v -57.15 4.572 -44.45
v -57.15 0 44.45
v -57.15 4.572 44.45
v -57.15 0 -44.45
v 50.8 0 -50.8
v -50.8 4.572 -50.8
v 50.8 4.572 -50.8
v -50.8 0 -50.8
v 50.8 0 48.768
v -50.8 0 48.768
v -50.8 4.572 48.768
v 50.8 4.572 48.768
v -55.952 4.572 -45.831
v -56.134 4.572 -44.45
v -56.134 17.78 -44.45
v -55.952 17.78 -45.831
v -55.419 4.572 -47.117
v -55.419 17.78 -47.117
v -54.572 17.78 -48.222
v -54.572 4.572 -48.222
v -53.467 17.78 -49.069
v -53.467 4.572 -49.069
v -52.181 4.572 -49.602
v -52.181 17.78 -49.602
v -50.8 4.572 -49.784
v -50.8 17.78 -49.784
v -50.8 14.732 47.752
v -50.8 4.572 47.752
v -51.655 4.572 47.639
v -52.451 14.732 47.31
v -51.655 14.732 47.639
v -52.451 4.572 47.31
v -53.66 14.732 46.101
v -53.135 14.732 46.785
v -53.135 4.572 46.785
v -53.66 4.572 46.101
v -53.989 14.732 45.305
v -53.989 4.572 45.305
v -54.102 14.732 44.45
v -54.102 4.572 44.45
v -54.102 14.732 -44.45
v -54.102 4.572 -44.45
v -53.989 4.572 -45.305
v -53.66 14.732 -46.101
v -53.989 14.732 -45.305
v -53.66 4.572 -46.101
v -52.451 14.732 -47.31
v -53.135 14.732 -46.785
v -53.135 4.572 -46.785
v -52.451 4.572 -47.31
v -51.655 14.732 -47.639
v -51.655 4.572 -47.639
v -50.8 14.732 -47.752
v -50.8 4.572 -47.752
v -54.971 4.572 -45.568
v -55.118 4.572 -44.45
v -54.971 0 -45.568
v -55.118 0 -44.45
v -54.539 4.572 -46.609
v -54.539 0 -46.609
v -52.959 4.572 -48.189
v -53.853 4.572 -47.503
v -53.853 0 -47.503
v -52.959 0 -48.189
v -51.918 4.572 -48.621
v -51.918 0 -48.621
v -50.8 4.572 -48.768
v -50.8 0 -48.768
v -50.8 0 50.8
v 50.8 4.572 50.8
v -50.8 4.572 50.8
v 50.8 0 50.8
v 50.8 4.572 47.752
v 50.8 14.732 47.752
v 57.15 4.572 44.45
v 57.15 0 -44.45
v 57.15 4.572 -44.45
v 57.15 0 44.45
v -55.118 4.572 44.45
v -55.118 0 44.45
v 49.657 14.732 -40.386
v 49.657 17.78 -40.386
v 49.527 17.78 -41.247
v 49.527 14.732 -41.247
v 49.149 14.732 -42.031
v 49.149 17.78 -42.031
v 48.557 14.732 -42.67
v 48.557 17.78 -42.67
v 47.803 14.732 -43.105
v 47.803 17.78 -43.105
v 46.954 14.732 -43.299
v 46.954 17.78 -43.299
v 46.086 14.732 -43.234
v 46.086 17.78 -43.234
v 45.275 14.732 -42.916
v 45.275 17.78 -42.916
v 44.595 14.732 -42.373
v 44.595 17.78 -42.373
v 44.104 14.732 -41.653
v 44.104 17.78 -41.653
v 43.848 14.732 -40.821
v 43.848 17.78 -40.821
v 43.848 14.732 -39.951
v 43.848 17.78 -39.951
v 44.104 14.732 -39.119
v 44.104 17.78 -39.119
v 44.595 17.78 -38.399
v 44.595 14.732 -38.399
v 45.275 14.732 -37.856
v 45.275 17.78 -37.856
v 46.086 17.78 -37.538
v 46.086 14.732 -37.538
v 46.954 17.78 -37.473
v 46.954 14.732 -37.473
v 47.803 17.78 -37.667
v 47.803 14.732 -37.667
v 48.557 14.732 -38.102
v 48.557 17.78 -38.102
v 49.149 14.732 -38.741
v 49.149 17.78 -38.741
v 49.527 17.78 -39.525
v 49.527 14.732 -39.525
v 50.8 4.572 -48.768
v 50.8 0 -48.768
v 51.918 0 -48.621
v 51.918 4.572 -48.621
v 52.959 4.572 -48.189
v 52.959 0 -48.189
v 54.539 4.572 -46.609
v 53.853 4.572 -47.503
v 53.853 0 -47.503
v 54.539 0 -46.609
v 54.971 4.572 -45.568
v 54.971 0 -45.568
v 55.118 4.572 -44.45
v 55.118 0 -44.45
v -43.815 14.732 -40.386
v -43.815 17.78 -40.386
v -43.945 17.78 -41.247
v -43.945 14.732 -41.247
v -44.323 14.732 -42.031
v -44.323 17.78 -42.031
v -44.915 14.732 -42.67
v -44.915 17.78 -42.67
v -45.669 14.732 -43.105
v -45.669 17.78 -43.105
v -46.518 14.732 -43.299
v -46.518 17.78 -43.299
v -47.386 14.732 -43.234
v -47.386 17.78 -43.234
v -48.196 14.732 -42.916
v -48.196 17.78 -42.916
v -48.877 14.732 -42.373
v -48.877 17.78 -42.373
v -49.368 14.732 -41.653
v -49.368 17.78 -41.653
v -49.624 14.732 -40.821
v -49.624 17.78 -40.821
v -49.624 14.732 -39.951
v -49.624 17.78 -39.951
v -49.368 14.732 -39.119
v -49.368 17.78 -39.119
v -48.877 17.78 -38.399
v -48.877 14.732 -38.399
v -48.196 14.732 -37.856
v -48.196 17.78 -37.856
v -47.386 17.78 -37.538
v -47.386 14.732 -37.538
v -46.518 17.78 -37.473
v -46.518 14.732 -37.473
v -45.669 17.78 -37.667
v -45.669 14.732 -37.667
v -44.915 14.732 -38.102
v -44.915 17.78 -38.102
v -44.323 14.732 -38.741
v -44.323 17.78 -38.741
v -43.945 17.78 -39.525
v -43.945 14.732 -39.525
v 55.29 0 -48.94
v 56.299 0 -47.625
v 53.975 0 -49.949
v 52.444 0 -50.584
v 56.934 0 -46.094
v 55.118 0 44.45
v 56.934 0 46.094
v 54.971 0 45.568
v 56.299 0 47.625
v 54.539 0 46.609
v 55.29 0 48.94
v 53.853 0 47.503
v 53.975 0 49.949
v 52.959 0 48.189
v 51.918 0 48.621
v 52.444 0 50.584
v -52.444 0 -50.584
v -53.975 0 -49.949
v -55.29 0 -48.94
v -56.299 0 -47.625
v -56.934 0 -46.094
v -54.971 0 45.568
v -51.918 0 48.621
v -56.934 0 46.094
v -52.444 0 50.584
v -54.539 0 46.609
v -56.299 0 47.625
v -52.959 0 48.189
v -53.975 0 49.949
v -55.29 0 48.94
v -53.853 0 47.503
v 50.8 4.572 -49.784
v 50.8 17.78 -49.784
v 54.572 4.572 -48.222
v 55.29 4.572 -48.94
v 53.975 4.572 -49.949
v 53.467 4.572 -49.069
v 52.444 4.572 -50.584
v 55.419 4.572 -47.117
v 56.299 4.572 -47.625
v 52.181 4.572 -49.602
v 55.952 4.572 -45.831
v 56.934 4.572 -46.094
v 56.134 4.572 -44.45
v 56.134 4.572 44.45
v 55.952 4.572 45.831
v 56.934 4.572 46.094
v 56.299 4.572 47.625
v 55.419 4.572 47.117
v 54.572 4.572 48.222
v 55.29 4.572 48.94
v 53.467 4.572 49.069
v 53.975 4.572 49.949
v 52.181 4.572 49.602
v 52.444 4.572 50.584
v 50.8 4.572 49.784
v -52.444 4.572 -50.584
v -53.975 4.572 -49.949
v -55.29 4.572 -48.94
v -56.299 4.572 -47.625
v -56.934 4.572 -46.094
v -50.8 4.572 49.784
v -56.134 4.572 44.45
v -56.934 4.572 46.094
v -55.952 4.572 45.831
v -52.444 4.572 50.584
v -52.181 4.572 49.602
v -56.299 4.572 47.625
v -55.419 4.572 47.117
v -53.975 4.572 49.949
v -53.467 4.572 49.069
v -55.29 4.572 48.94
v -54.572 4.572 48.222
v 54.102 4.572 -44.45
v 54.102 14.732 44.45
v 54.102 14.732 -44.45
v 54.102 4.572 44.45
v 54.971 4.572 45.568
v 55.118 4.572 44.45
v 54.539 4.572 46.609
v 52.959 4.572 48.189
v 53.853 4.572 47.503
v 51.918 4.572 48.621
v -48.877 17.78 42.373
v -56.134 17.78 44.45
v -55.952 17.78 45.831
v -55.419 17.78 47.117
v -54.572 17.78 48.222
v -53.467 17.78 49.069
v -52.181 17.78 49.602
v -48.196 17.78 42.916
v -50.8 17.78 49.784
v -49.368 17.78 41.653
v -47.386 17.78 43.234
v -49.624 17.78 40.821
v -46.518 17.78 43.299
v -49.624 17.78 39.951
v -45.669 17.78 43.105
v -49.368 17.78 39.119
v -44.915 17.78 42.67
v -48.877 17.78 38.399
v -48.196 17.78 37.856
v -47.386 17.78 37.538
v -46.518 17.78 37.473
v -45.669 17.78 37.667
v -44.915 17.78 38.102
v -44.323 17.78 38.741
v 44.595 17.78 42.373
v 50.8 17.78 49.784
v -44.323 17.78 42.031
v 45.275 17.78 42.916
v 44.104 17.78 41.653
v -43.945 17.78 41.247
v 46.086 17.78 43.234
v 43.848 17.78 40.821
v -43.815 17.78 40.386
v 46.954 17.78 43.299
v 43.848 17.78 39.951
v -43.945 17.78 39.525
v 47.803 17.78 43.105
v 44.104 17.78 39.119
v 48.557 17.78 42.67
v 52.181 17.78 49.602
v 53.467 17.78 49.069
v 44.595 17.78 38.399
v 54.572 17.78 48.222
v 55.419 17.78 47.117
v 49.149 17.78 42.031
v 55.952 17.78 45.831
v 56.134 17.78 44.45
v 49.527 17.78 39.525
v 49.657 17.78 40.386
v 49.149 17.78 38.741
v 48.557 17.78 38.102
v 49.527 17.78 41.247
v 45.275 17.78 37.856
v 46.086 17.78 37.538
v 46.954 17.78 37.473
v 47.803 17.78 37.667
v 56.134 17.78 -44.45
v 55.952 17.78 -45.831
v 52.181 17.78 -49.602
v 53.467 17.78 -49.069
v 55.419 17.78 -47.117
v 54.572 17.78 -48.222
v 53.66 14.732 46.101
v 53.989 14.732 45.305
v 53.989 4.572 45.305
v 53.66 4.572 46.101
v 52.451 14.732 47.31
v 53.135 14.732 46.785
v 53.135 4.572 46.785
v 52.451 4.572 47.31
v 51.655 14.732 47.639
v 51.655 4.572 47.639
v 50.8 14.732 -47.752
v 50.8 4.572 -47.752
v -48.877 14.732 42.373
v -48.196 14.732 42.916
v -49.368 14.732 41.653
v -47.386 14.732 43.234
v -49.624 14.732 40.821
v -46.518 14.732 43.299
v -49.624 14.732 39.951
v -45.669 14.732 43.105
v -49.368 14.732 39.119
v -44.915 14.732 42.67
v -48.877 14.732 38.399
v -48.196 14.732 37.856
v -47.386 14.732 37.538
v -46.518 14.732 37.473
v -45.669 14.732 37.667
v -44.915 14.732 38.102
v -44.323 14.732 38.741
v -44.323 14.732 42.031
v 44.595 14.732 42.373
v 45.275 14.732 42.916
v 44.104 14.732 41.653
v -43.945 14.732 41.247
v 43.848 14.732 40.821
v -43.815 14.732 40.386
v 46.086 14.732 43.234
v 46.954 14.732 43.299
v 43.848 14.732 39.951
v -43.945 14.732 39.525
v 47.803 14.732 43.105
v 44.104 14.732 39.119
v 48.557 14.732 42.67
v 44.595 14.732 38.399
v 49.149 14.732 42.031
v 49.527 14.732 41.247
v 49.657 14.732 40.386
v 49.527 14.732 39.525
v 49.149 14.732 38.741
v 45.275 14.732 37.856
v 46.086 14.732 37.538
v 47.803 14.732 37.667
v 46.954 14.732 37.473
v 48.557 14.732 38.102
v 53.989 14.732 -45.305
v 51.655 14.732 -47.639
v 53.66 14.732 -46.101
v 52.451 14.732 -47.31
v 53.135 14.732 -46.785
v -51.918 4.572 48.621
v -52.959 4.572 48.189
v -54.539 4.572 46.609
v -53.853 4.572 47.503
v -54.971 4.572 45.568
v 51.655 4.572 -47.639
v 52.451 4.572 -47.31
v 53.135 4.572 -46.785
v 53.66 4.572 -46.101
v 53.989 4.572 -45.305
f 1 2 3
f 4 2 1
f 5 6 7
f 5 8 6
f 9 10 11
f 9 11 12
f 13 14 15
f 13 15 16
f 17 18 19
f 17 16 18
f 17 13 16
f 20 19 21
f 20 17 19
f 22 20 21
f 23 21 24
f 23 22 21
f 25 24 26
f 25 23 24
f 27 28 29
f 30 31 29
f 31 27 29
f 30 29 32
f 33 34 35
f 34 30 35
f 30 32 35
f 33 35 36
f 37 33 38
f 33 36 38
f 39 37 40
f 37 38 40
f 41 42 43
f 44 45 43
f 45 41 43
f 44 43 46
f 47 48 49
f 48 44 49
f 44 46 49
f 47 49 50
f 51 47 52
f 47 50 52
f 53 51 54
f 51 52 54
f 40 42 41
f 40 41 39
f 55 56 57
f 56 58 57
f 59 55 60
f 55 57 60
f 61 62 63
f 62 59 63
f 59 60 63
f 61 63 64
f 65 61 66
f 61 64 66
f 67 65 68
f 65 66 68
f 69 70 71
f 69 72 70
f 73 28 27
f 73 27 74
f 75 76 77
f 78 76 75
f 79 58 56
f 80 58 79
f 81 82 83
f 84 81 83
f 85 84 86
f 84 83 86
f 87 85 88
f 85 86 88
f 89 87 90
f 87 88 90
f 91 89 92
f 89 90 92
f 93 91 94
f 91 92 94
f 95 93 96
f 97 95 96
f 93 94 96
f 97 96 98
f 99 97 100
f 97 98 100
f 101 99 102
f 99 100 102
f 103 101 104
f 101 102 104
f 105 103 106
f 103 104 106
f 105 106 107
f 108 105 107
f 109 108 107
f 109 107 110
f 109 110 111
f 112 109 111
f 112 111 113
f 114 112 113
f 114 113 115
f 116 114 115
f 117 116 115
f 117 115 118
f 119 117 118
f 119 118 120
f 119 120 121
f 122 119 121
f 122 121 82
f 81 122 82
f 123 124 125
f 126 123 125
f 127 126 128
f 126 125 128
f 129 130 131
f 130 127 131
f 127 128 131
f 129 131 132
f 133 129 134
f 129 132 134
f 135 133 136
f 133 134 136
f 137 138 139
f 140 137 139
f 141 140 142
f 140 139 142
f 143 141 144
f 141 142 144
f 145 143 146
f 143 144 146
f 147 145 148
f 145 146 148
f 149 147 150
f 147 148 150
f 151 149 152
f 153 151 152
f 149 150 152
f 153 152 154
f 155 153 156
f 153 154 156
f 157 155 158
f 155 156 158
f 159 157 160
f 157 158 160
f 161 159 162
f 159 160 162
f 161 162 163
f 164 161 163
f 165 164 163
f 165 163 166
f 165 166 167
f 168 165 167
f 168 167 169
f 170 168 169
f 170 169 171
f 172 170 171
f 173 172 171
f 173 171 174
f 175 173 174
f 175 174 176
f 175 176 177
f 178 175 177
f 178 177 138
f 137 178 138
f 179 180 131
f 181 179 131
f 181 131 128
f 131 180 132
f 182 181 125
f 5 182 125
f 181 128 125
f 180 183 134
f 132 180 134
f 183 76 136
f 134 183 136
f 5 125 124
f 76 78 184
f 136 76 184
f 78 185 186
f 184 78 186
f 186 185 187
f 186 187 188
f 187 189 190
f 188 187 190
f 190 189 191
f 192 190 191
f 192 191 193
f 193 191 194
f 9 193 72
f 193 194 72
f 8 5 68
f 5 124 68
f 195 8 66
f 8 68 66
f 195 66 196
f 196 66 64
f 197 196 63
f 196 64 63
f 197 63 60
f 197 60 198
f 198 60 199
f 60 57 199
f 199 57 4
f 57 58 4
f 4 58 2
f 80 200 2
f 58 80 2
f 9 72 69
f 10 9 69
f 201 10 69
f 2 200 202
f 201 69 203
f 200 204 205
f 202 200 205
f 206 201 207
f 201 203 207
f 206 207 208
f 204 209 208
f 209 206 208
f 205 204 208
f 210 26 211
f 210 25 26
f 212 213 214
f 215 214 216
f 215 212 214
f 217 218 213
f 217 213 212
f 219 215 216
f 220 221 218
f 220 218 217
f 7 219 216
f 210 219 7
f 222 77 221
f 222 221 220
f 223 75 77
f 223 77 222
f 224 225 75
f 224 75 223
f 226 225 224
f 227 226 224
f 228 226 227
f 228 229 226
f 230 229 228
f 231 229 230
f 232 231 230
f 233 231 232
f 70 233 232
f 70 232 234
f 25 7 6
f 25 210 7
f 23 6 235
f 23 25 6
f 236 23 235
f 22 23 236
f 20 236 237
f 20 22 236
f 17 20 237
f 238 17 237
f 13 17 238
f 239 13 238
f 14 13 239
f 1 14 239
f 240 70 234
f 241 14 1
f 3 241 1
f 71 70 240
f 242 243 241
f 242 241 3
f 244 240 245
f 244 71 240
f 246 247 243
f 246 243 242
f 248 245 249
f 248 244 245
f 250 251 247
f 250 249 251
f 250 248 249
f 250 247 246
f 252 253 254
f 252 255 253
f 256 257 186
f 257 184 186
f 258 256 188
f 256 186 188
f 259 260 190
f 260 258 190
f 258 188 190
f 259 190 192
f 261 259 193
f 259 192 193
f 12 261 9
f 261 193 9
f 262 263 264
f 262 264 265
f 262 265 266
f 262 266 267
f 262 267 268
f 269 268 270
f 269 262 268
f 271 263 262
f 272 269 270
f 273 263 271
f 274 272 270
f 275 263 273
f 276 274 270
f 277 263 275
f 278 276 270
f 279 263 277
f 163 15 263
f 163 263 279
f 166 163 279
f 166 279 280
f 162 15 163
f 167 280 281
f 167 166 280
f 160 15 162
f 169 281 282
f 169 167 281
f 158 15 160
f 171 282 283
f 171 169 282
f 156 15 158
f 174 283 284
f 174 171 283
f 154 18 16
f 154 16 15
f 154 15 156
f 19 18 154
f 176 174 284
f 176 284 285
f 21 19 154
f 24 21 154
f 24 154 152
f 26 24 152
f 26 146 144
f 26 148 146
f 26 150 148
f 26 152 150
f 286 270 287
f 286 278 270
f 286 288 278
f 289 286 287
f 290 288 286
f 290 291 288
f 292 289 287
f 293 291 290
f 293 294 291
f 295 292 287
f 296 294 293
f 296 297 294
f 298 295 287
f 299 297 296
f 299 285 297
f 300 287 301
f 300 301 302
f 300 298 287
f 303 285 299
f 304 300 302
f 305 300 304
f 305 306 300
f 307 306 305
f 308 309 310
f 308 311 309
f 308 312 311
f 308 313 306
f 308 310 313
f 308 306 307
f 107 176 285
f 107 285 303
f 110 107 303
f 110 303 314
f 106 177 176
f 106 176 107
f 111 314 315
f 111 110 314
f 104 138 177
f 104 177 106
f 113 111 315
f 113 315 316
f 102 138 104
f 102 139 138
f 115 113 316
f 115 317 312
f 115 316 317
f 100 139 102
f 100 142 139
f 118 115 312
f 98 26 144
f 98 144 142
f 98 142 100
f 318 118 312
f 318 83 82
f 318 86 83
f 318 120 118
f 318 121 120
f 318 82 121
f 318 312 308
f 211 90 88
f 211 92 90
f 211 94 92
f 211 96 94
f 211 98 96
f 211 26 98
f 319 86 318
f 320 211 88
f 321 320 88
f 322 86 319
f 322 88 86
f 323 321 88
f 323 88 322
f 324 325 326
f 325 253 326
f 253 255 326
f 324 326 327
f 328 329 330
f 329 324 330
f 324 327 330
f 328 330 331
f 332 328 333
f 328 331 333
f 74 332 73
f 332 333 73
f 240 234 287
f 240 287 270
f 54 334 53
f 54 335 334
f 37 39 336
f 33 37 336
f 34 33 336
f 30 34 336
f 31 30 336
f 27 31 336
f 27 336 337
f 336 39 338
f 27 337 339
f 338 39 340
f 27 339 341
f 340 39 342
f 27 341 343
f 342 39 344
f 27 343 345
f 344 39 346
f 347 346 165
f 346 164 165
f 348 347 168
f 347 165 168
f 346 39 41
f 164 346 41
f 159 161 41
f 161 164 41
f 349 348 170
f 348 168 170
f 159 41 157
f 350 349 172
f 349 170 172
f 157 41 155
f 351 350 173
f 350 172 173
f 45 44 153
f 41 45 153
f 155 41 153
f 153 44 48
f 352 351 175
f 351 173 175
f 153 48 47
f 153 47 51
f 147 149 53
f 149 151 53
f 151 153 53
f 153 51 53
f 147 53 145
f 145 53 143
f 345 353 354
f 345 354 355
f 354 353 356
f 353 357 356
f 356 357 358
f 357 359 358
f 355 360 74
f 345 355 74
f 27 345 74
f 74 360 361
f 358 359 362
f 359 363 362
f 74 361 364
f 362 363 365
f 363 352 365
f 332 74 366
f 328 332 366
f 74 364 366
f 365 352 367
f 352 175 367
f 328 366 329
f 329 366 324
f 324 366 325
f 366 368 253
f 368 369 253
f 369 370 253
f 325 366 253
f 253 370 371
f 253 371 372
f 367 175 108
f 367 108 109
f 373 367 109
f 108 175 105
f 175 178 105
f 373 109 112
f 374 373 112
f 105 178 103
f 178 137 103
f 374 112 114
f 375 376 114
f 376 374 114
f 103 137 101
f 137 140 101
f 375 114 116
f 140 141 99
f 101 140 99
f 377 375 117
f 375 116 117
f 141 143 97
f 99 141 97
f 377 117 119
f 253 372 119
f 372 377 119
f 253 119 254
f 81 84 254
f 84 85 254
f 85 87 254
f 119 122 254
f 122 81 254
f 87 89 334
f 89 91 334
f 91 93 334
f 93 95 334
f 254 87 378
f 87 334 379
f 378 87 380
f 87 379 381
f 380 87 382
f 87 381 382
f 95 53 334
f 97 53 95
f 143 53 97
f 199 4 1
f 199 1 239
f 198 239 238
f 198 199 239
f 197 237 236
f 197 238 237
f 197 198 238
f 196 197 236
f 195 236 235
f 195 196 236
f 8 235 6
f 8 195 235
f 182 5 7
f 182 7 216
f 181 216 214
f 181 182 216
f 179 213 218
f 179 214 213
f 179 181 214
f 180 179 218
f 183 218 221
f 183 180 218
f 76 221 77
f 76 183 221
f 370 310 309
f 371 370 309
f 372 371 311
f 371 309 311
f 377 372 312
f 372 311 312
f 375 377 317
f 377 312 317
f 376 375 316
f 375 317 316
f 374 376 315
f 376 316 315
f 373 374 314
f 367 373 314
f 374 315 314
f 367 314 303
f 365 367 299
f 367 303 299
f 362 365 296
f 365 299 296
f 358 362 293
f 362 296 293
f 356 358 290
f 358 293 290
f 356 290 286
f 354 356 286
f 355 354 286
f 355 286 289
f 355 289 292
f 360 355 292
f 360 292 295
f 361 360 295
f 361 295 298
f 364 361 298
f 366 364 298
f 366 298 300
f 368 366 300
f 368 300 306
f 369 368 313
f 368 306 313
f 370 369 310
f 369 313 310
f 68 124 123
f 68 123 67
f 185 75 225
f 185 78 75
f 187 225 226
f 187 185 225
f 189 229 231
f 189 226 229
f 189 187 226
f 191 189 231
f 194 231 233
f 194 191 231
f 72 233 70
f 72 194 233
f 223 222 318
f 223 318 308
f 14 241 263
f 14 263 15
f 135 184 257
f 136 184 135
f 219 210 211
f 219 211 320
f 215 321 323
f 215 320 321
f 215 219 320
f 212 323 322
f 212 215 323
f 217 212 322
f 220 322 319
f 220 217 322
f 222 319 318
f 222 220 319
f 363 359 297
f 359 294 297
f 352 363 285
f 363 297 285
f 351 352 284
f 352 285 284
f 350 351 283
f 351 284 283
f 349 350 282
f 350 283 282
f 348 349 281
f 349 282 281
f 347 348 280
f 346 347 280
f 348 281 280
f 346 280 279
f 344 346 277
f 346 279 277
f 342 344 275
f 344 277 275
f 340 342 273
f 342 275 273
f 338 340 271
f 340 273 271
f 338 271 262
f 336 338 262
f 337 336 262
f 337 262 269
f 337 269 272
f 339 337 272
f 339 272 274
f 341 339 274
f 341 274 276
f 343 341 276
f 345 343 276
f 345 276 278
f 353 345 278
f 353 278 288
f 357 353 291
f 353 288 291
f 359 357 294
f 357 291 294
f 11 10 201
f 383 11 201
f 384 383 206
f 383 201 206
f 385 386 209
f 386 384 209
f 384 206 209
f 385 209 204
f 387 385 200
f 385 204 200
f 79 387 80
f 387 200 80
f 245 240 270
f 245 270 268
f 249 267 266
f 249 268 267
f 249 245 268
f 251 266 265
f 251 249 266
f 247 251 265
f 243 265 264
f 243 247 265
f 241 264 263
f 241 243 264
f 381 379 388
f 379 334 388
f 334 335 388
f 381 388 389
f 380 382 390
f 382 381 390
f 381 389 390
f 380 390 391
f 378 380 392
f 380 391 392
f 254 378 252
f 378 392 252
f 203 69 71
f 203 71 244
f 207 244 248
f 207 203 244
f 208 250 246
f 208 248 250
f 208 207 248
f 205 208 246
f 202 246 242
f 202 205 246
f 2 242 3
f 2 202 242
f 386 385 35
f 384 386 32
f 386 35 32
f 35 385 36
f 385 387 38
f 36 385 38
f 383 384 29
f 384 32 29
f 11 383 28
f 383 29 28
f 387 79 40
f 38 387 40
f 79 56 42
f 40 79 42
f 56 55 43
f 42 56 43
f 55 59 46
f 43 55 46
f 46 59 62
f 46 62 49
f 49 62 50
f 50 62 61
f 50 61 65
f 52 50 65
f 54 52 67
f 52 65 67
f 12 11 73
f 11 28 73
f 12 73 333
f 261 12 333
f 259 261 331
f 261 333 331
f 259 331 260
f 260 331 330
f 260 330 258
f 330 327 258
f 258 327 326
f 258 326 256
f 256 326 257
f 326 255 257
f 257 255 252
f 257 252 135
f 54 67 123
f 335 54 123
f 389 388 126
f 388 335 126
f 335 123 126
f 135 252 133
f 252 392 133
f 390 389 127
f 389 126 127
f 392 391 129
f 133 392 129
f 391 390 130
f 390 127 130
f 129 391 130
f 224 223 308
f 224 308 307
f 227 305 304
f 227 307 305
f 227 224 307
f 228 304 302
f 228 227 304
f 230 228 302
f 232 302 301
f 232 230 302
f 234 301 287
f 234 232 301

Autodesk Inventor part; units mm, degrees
ref_plane "YZ Plane" through (0, 0, 0) normal (1, 0, 0) x (0, 1, 0)
ref_plane "XZ Plane" through (0, 0, 0) normal (0, 1, 0) x (-1, 0, 0)
ref_plane "XY Plane" through (0, 0, 0) normal (0, 0, 1) x (1, 0, 0)
sketch "Sketch2" plane through (0, 0, 0) normal (0, 1, 0) x (-1, 0, 0)
  line L0 (-50.8, 50.8) -> (50.8, 50.8)
  line L1 (57.15, 44.45) -> (57.15, -44.45)
  line L2 (50.8, -50.8) -> (-50.8, -50.8)
  line L3 (-57.15, -44.45) -> (-57.15, 44.45)
  arc A0 (-50.8, 50.8) -> (-57.15, 44.45) centre (-50.8, 44.45) ccw
  arc A1 (-57.15, -44.45) -> (-50.8, -50.8) centre (-50.8, -44.45) ccw
  arc A2 (50.8, -50.8) -> (57.15, -44.45) centre (50.8, -44.45) ccw
  arc A3 (57.15, 44.45) -> (50.8, 50.8) centre (50.8, 44.45) ccw
  line L4 (50.8, 48.768) -> (-50.8, 48.768)
  arc A4 (-50.8, 48.768) -> (-55.118, 44.45) centre (-50.8, 44.45) ccw
  line L5 (-55.118, 44.45) -> (-55.118, -44.45)
  arc A5 (-55.118, -44.45) -> (-50.8, -48.768) centre (-50.8, -44.45) ccw
  line L6 (-50.8, -48.768) -> (50.8, -48.768)
  arc A6 (50.8, -48.768) -> (55.118, -44.45) centre (50.8, -44.45) ccw
  line L7 (55.118, -44.45) -> (55.118, 44.45)
  arc A7 (55.118, 44.45) -> (50.8, 48.768) centre (50.8, 44.45) ccw
  line L8 (-50.8, 44.45) -> (50.8, -44.45) construction
  point P0 (0, 0)
  point P1 (0, 0)
  point P2 (0, 0)
  dimension "d0" = 114.3
  dimension "d1" = 101.6
  dimension "d2" = 6.35
  dimension "d3" = 2.032
extrude "Extrusion1" add sketch "Sketch2" along normal blind 4.572
sketch "Sketch3" plane through (0, 4.572, 0) normal (0, 1, 0) x (1, 0, 0)
  line L0 (-55.118, -44.45) -> (-55.118, 44.45) projected
  arc A0 (-50.8, 48.768) -> (-55.118, 44.45) centre (-50.8, 44.45) ccw projected
  line L1 (-50.8, 48.768) -> (50.8, 48.768) projected
  line L2 (55.118, 44.45) -> (55.118, -44.45) projected
  line L3 (50.8, -48.768) -> (-50.8, -48.768) projected
  line L4 (-50.8, 49.784) -> (50.8, 49.784)
  line L5 (56.134, 44.45) -> (56.134, -44.45)
  line L6 (50.8, -49.784) -> (-50.8, -49.784)
  line L7 (-56.134, -44.45) -> (-56.134, 44.45)
  arc A1 (-50.8, 49.784) -> (-56.134, 44.45) centre (-50.8, 44.45) ccw
  arc A2 (-56.134, -44.45) -> (-50.8, -49.784) centre (-50.8, -44.45) ccw
  arc A3 (50.8, -49.784) -> (56.134, -44.45) centre (50.8, -44.45) ccw
  arc A4 (56.134, 44.45) -> (50.8, 49.784) centre (50.8, 44.45) ccw
  line L8 (-54.102, 44.45) -> (-54.102, -44.45)
  arc A5 (-54.102, -44.45) -> (-50.8, -47.752) centre (-50.8, -44.45) ccw
  line L9 (-50.8, -47.752) -> (50.8, -47.752)
  arc A6 (50.8, -47.752) -> (54.102, -44.45) centre (50.8, -44.45) ccw
  line L10 (54.102, -44.45) -> (54.102, 44.45)
  arc A7 (54.102, 44.45) -> (50.8, 47.752) centre (50.8, 44.45) ccw
  line L11 (50.8, 47.752) -> (-50.8, 47.752)
  arc A8 (-50.8, 47.752) -> (-54.102, 44.45) centre (-50.8, 44.45) ccw
  point P0 (0, 0)
  dimension "d7" = 1.016
  dimension "d8" = 1.016
  dimension "d9" = 1.016
  dimension "d10" = 1.016
  dimension "d11" = 2.032
extrude "Extrusion2" add sketch "Sketch3" along normal blind 10.16
sketch "Sketch5" plane through (0, 14.732, 0) normal (0, 1, 0) x (1, 0, 0)
  arc A0 (-50.8, 49.784) -> (-56.134, 44.45) centre (-50.8, 44.45) ccw projected
  line L0 (-56.134, -44.45) -> (-56.134, 44.45) projected
  arc A1 (-56.134, -44.45) -> (-50.8, -49.784) centre (-50.8, -44.45) ccw projected
  line L1 (50.8, -49.784) -> (-50.8, -49.784) projected
  arc A2 (50.8, -49.784) -> (56.134, -44.45) centre (50.8, -44.45) ccw projected
  line L2 (56.134, 44.45) -> (56.134, -44.45) projected
  arc A3 (56.134, 44.45) -> (50.8, 49.784) centre (50.8, 44.45) ccw projected
  line L3 (-50.8, 49.784) -> (50.8, 49.784) projected
  point P0 (0, 0)
extrude "Extrusion3" add sketch "Sketch5" along normal blind 3.048
sketch "Sketch6" plane through (0, 17.78, 0) normal (0, 1, 0) x (1, 0, 0)
  line L0 (-50.8, 49.784) -> (50.8, 49.784) projected
  line L1 (-56.134, -44.45) -> (-56.134, 44.45) projected
  line L2 (56.134, 44.45) -> (56.134, -44.45) projected
  circle A0 centre (-46.736, 40.386) radius 2.921
  circle A1 centre (-46.736, -40.386) radius 2.921
  circle A2 centre (46.736, -40.386) radius 2.921
  circle A3 centre (46.736, 40.386) radius 2.921
  line L3 (-46.736, 40.386) -> (-46.736, -40.386) construction
  line L4 (-46.736, -40.386) -> (46.736, -40.386) construction
  line L5 (46.736, -40.386) -> (46.736, 40.386) construction
  line L6 (46.736, 40.386) -> (-46.736, 40.386) construction
  line L7 (-46.736, 40.386) -> (46.736, -40.386) construction
  point P0 (0, 0)
  point P1 (0, 0)
  dimension "d16" = 5.842
  dimension "d20" = 87.63
  dimension "d21" = 9.398
  dimension "d22" = 9.398
extrude "Extrusion4" cut sketch "Sketch6" against normal through all
properties part number "Plate"
